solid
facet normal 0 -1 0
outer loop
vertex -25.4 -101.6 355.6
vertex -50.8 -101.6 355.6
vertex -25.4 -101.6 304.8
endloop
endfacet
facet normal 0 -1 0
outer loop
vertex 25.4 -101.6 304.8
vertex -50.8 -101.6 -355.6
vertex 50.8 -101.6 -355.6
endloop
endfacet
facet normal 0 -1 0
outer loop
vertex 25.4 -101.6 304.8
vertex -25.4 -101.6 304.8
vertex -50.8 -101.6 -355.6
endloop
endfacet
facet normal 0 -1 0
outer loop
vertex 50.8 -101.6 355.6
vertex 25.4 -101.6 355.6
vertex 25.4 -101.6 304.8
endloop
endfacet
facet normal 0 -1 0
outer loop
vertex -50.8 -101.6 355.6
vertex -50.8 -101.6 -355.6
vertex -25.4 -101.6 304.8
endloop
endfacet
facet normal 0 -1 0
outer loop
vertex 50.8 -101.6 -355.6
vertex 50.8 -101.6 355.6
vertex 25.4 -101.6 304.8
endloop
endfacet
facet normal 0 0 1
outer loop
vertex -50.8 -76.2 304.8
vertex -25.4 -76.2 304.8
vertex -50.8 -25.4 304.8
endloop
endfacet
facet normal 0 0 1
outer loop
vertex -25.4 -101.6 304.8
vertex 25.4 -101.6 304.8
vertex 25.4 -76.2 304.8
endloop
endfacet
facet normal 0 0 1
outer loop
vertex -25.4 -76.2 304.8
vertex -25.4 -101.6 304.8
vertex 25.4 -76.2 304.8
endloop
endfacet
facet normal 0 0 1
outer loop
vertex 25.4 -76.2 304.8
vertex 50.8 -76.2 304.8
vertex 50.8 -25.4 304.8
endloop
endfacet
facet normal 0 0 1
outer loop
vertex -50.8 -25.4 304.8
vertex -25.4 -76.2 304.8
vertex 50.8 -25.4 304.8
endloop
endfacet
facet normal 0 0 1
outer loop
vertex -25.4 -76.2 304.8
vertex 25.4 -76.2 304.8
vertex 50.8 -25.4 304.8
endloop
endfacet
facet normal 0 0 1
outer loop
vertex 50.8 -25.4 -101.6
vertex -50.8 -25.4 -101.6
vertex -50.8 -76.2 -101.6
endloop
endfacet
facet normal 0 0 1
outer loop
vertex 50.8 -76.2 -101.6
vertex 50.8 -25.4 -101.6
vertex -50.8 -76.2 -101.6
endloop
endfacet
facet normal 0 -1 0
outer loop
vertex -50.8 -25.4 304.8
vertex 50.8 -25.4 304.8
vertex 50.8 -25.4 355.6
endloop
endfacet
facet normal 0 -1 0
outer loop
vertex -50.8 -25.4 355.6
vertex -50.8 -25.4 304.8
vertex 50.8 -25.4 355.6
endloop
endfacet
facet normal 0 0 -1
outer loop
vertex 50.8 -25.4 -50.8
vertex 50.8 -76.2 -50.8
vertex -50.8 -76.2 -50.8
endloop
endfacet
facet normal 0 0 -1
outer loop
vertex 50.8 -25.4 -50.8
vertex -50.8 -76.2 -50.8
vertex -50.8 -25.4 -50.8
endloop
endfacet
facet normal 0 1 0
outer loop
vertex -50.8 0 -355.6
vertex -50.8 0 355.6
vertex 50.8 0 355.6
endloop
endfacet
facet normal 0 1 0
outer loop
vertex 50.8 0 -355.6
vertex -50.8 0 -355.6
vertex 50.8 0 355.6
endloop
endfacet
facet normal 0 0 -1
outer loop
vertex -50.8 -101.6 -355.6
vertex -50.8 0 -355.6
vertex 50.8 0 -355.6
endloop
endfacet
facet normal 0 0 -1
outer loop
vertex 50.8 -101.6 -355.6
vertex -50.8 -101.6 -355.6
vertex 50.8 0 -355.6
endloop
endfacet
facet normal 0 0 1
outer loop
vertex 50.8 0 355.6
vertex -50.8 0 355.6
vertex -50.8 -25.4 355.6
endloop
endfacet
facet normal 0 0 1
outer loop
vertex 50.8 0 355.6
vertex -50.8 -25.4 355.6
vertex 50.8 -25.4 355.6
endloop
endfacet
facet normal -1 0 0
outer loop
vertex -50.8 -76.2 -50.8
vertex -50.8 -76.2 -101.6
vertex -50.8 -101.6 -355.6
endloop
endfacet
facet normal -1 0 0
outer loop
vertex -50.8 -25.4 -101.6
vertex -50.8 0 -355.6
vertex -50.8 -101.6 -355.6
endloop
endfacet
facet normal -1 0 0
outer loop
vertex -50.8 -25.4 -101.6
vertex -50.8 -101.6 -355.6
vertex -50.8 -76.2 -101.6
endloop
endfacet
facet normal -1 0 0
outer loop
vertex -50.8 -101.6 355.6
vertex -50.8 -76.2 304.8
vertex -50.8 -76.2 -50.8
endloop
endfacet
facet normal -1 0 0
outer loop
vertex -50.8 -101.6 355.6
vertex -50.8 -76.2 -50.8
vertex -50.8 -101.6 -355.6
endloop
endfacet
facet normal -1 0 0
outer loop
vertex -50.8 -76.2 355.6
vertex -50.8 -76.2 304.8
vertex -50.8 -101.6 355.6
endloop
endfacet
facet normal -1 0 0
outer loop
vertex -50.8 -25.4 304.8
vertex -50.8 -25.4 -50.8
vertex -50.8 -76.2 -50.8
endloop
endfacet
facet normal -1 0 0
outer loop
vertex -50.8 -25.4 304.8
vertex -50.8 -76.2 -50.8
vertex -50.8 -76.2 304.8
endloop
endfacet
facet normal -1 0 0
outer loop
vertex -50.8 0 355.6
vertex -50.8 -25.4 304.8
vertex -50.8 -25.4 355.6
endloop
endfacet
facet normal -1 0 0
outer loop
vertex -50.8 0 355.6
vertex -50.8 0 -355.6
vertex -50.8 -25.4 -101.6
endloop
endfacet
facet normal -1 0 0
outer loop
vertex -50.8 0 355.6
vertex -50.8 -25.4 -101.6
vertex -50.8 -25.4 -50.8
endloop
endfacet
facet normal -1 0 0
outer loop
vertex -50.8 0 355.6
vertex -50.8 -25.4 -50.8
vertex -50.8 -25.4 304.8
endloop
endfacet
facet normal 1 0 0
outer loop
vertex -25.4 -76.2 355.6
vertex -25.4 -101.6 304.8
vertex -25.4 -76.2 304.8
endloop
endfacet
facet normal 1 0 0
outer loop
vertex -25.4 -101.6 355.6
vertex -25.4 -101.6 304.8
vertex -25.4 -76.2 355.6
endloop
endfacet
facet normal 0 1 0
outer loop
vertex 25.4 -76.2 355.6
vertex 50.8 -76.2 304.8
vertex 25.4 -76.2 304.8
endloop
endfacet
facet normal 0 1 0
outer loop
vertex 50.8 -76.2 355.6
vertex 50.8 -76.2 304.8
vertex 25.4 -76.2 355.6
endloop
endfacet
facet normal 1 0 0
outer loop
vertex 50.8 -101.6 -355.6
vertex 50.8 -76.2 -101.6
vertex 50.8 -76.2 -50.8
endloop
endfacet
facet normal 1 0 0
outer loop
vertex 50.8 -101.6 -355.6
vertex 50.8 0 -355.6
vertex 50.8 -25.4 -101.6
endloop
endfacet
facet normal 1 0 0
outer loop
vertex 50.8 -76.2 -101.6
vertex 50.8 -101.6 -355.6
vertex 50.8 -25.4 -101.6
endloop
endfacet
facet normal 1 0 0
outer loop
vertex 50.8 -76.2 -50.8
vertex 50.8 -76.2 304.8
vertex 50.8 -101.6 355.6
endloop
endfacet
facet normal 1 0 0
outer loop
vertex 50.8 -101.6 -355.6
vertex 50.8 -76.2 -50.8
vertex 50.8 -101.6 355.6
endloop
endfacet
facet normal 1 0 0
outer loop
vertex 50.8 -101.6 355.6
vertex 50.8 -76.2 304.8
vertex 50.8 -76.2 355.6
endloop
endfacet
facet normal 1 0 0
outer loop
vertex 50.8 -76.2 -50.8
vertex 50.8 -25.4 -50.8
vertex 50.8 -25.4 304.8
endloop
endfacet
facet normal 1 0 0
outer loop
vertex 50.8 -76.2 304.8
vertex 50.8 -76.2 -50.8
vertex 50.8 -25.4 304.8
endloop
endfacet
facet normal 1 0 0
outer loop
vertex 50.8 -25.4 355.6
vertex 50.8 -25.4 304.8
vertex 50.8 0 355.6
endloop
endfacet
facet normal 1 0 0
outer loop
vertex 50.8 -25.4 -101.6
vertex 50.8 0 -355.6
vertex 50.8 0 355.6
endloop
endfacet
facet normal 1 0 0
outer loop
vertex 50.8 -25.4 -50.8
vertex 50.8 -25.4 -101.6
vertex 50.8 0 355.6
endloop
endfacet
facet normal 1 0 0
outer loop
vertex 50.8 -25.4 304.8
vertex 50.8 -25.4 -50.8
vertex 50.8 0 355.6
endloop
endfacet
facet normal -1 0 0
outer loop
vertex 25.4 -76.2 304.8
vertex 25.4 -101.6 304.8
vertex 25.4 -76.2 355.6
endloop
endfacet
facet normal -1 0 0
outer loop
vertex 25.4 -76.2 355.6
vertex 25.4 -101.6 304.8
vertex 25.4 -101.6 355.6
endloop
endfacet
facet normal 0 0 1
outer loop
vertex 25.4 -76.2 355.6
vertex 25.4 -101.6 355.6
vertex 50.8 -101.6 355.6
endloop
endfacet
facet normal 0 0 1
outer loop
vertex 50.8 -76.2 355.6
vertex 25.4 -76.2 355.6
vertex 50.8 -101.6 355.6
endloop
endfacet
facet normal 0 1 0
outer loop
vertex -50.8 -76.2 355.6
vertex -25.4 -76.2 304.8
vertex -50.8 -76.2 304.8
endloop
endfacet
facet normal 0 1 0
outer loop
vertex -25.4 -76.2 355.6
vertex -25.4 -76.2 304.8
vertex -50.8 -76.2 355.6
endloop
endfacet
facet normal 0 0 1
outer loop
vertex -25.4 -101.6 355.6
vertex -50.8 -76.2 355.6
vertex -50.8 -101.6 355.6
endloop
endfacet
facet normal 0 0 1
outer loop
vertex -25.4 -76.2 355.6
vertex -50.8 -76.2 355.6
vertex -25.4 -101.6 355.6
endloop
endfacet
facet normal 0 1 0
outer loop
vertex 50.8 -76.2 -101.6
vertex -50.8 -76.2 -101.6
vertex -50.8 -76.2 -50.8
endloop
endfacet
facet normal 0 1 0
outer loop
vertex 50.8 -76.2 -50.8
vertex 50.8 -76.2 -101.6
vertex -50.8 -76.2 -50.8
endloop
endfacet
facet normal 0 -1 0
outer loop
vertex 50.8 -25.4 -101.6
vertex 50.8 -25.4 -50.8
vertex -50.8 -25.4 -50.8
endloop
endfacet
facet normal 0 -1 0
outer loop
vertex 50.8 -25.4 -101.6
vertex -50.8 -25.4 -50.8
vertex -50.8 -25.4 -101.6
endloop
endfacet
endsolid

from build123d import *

# Parameters (mm, degrees)
F0_W     = 101.6
F0_H     = 711.2
F1_DEPTH = 101.6
F3_W     = 50.8
F3_H     = 50.8
F4_DEPTH = 101.6
F2_W     = 50.8
F2_H     = 50.8
F5_DEPTH = 25.4
F7_DEPTH = 101.6


with BuildPart() as f1:
    # F0 (on Front) → F1 (new body)
    with BuildSketch(Plane.XZ):
        Rectangle(F0_W, F0_H)
    extrude(amount=F1_DEPTH)

    # F3 (on face) → F4 (cut)
    with BuildSketch(Plane.YZ.offset(50.8)):
        with Locations((-50.8, 330.2)):
            Rectangle(F3_W, F3_H)
    extrude(amount=-F4_DEPTH, mode=Mode.SUBTRACT)

    # F2 (on face) → F5 (cut)
    with BuildSketch(Plane.XZ.offset(101.6)):
        with Locations((0, 330.2)):
            Rectangle(F2_W, F2_H)
    extrude(amount=-F5_DEPTH, mode=Mode.SUBTRACT)

    # F6 (on face) → F7 (cut)
    with BuildSketch(Plane(origin=(-50.8, 0, 0), x_dir=(0, -1, 0), z_dir=(-1, 0, 0))):
        Polygon((50.8, -101.6), (76.2, -101.6), (76.2, -50.8), (25.4, -50.8), (25.4, -101.6), align=None)
    extrude(amount=-F7_DEPTH, mode=Mode.SUBTRACT)


solid = f1.part
